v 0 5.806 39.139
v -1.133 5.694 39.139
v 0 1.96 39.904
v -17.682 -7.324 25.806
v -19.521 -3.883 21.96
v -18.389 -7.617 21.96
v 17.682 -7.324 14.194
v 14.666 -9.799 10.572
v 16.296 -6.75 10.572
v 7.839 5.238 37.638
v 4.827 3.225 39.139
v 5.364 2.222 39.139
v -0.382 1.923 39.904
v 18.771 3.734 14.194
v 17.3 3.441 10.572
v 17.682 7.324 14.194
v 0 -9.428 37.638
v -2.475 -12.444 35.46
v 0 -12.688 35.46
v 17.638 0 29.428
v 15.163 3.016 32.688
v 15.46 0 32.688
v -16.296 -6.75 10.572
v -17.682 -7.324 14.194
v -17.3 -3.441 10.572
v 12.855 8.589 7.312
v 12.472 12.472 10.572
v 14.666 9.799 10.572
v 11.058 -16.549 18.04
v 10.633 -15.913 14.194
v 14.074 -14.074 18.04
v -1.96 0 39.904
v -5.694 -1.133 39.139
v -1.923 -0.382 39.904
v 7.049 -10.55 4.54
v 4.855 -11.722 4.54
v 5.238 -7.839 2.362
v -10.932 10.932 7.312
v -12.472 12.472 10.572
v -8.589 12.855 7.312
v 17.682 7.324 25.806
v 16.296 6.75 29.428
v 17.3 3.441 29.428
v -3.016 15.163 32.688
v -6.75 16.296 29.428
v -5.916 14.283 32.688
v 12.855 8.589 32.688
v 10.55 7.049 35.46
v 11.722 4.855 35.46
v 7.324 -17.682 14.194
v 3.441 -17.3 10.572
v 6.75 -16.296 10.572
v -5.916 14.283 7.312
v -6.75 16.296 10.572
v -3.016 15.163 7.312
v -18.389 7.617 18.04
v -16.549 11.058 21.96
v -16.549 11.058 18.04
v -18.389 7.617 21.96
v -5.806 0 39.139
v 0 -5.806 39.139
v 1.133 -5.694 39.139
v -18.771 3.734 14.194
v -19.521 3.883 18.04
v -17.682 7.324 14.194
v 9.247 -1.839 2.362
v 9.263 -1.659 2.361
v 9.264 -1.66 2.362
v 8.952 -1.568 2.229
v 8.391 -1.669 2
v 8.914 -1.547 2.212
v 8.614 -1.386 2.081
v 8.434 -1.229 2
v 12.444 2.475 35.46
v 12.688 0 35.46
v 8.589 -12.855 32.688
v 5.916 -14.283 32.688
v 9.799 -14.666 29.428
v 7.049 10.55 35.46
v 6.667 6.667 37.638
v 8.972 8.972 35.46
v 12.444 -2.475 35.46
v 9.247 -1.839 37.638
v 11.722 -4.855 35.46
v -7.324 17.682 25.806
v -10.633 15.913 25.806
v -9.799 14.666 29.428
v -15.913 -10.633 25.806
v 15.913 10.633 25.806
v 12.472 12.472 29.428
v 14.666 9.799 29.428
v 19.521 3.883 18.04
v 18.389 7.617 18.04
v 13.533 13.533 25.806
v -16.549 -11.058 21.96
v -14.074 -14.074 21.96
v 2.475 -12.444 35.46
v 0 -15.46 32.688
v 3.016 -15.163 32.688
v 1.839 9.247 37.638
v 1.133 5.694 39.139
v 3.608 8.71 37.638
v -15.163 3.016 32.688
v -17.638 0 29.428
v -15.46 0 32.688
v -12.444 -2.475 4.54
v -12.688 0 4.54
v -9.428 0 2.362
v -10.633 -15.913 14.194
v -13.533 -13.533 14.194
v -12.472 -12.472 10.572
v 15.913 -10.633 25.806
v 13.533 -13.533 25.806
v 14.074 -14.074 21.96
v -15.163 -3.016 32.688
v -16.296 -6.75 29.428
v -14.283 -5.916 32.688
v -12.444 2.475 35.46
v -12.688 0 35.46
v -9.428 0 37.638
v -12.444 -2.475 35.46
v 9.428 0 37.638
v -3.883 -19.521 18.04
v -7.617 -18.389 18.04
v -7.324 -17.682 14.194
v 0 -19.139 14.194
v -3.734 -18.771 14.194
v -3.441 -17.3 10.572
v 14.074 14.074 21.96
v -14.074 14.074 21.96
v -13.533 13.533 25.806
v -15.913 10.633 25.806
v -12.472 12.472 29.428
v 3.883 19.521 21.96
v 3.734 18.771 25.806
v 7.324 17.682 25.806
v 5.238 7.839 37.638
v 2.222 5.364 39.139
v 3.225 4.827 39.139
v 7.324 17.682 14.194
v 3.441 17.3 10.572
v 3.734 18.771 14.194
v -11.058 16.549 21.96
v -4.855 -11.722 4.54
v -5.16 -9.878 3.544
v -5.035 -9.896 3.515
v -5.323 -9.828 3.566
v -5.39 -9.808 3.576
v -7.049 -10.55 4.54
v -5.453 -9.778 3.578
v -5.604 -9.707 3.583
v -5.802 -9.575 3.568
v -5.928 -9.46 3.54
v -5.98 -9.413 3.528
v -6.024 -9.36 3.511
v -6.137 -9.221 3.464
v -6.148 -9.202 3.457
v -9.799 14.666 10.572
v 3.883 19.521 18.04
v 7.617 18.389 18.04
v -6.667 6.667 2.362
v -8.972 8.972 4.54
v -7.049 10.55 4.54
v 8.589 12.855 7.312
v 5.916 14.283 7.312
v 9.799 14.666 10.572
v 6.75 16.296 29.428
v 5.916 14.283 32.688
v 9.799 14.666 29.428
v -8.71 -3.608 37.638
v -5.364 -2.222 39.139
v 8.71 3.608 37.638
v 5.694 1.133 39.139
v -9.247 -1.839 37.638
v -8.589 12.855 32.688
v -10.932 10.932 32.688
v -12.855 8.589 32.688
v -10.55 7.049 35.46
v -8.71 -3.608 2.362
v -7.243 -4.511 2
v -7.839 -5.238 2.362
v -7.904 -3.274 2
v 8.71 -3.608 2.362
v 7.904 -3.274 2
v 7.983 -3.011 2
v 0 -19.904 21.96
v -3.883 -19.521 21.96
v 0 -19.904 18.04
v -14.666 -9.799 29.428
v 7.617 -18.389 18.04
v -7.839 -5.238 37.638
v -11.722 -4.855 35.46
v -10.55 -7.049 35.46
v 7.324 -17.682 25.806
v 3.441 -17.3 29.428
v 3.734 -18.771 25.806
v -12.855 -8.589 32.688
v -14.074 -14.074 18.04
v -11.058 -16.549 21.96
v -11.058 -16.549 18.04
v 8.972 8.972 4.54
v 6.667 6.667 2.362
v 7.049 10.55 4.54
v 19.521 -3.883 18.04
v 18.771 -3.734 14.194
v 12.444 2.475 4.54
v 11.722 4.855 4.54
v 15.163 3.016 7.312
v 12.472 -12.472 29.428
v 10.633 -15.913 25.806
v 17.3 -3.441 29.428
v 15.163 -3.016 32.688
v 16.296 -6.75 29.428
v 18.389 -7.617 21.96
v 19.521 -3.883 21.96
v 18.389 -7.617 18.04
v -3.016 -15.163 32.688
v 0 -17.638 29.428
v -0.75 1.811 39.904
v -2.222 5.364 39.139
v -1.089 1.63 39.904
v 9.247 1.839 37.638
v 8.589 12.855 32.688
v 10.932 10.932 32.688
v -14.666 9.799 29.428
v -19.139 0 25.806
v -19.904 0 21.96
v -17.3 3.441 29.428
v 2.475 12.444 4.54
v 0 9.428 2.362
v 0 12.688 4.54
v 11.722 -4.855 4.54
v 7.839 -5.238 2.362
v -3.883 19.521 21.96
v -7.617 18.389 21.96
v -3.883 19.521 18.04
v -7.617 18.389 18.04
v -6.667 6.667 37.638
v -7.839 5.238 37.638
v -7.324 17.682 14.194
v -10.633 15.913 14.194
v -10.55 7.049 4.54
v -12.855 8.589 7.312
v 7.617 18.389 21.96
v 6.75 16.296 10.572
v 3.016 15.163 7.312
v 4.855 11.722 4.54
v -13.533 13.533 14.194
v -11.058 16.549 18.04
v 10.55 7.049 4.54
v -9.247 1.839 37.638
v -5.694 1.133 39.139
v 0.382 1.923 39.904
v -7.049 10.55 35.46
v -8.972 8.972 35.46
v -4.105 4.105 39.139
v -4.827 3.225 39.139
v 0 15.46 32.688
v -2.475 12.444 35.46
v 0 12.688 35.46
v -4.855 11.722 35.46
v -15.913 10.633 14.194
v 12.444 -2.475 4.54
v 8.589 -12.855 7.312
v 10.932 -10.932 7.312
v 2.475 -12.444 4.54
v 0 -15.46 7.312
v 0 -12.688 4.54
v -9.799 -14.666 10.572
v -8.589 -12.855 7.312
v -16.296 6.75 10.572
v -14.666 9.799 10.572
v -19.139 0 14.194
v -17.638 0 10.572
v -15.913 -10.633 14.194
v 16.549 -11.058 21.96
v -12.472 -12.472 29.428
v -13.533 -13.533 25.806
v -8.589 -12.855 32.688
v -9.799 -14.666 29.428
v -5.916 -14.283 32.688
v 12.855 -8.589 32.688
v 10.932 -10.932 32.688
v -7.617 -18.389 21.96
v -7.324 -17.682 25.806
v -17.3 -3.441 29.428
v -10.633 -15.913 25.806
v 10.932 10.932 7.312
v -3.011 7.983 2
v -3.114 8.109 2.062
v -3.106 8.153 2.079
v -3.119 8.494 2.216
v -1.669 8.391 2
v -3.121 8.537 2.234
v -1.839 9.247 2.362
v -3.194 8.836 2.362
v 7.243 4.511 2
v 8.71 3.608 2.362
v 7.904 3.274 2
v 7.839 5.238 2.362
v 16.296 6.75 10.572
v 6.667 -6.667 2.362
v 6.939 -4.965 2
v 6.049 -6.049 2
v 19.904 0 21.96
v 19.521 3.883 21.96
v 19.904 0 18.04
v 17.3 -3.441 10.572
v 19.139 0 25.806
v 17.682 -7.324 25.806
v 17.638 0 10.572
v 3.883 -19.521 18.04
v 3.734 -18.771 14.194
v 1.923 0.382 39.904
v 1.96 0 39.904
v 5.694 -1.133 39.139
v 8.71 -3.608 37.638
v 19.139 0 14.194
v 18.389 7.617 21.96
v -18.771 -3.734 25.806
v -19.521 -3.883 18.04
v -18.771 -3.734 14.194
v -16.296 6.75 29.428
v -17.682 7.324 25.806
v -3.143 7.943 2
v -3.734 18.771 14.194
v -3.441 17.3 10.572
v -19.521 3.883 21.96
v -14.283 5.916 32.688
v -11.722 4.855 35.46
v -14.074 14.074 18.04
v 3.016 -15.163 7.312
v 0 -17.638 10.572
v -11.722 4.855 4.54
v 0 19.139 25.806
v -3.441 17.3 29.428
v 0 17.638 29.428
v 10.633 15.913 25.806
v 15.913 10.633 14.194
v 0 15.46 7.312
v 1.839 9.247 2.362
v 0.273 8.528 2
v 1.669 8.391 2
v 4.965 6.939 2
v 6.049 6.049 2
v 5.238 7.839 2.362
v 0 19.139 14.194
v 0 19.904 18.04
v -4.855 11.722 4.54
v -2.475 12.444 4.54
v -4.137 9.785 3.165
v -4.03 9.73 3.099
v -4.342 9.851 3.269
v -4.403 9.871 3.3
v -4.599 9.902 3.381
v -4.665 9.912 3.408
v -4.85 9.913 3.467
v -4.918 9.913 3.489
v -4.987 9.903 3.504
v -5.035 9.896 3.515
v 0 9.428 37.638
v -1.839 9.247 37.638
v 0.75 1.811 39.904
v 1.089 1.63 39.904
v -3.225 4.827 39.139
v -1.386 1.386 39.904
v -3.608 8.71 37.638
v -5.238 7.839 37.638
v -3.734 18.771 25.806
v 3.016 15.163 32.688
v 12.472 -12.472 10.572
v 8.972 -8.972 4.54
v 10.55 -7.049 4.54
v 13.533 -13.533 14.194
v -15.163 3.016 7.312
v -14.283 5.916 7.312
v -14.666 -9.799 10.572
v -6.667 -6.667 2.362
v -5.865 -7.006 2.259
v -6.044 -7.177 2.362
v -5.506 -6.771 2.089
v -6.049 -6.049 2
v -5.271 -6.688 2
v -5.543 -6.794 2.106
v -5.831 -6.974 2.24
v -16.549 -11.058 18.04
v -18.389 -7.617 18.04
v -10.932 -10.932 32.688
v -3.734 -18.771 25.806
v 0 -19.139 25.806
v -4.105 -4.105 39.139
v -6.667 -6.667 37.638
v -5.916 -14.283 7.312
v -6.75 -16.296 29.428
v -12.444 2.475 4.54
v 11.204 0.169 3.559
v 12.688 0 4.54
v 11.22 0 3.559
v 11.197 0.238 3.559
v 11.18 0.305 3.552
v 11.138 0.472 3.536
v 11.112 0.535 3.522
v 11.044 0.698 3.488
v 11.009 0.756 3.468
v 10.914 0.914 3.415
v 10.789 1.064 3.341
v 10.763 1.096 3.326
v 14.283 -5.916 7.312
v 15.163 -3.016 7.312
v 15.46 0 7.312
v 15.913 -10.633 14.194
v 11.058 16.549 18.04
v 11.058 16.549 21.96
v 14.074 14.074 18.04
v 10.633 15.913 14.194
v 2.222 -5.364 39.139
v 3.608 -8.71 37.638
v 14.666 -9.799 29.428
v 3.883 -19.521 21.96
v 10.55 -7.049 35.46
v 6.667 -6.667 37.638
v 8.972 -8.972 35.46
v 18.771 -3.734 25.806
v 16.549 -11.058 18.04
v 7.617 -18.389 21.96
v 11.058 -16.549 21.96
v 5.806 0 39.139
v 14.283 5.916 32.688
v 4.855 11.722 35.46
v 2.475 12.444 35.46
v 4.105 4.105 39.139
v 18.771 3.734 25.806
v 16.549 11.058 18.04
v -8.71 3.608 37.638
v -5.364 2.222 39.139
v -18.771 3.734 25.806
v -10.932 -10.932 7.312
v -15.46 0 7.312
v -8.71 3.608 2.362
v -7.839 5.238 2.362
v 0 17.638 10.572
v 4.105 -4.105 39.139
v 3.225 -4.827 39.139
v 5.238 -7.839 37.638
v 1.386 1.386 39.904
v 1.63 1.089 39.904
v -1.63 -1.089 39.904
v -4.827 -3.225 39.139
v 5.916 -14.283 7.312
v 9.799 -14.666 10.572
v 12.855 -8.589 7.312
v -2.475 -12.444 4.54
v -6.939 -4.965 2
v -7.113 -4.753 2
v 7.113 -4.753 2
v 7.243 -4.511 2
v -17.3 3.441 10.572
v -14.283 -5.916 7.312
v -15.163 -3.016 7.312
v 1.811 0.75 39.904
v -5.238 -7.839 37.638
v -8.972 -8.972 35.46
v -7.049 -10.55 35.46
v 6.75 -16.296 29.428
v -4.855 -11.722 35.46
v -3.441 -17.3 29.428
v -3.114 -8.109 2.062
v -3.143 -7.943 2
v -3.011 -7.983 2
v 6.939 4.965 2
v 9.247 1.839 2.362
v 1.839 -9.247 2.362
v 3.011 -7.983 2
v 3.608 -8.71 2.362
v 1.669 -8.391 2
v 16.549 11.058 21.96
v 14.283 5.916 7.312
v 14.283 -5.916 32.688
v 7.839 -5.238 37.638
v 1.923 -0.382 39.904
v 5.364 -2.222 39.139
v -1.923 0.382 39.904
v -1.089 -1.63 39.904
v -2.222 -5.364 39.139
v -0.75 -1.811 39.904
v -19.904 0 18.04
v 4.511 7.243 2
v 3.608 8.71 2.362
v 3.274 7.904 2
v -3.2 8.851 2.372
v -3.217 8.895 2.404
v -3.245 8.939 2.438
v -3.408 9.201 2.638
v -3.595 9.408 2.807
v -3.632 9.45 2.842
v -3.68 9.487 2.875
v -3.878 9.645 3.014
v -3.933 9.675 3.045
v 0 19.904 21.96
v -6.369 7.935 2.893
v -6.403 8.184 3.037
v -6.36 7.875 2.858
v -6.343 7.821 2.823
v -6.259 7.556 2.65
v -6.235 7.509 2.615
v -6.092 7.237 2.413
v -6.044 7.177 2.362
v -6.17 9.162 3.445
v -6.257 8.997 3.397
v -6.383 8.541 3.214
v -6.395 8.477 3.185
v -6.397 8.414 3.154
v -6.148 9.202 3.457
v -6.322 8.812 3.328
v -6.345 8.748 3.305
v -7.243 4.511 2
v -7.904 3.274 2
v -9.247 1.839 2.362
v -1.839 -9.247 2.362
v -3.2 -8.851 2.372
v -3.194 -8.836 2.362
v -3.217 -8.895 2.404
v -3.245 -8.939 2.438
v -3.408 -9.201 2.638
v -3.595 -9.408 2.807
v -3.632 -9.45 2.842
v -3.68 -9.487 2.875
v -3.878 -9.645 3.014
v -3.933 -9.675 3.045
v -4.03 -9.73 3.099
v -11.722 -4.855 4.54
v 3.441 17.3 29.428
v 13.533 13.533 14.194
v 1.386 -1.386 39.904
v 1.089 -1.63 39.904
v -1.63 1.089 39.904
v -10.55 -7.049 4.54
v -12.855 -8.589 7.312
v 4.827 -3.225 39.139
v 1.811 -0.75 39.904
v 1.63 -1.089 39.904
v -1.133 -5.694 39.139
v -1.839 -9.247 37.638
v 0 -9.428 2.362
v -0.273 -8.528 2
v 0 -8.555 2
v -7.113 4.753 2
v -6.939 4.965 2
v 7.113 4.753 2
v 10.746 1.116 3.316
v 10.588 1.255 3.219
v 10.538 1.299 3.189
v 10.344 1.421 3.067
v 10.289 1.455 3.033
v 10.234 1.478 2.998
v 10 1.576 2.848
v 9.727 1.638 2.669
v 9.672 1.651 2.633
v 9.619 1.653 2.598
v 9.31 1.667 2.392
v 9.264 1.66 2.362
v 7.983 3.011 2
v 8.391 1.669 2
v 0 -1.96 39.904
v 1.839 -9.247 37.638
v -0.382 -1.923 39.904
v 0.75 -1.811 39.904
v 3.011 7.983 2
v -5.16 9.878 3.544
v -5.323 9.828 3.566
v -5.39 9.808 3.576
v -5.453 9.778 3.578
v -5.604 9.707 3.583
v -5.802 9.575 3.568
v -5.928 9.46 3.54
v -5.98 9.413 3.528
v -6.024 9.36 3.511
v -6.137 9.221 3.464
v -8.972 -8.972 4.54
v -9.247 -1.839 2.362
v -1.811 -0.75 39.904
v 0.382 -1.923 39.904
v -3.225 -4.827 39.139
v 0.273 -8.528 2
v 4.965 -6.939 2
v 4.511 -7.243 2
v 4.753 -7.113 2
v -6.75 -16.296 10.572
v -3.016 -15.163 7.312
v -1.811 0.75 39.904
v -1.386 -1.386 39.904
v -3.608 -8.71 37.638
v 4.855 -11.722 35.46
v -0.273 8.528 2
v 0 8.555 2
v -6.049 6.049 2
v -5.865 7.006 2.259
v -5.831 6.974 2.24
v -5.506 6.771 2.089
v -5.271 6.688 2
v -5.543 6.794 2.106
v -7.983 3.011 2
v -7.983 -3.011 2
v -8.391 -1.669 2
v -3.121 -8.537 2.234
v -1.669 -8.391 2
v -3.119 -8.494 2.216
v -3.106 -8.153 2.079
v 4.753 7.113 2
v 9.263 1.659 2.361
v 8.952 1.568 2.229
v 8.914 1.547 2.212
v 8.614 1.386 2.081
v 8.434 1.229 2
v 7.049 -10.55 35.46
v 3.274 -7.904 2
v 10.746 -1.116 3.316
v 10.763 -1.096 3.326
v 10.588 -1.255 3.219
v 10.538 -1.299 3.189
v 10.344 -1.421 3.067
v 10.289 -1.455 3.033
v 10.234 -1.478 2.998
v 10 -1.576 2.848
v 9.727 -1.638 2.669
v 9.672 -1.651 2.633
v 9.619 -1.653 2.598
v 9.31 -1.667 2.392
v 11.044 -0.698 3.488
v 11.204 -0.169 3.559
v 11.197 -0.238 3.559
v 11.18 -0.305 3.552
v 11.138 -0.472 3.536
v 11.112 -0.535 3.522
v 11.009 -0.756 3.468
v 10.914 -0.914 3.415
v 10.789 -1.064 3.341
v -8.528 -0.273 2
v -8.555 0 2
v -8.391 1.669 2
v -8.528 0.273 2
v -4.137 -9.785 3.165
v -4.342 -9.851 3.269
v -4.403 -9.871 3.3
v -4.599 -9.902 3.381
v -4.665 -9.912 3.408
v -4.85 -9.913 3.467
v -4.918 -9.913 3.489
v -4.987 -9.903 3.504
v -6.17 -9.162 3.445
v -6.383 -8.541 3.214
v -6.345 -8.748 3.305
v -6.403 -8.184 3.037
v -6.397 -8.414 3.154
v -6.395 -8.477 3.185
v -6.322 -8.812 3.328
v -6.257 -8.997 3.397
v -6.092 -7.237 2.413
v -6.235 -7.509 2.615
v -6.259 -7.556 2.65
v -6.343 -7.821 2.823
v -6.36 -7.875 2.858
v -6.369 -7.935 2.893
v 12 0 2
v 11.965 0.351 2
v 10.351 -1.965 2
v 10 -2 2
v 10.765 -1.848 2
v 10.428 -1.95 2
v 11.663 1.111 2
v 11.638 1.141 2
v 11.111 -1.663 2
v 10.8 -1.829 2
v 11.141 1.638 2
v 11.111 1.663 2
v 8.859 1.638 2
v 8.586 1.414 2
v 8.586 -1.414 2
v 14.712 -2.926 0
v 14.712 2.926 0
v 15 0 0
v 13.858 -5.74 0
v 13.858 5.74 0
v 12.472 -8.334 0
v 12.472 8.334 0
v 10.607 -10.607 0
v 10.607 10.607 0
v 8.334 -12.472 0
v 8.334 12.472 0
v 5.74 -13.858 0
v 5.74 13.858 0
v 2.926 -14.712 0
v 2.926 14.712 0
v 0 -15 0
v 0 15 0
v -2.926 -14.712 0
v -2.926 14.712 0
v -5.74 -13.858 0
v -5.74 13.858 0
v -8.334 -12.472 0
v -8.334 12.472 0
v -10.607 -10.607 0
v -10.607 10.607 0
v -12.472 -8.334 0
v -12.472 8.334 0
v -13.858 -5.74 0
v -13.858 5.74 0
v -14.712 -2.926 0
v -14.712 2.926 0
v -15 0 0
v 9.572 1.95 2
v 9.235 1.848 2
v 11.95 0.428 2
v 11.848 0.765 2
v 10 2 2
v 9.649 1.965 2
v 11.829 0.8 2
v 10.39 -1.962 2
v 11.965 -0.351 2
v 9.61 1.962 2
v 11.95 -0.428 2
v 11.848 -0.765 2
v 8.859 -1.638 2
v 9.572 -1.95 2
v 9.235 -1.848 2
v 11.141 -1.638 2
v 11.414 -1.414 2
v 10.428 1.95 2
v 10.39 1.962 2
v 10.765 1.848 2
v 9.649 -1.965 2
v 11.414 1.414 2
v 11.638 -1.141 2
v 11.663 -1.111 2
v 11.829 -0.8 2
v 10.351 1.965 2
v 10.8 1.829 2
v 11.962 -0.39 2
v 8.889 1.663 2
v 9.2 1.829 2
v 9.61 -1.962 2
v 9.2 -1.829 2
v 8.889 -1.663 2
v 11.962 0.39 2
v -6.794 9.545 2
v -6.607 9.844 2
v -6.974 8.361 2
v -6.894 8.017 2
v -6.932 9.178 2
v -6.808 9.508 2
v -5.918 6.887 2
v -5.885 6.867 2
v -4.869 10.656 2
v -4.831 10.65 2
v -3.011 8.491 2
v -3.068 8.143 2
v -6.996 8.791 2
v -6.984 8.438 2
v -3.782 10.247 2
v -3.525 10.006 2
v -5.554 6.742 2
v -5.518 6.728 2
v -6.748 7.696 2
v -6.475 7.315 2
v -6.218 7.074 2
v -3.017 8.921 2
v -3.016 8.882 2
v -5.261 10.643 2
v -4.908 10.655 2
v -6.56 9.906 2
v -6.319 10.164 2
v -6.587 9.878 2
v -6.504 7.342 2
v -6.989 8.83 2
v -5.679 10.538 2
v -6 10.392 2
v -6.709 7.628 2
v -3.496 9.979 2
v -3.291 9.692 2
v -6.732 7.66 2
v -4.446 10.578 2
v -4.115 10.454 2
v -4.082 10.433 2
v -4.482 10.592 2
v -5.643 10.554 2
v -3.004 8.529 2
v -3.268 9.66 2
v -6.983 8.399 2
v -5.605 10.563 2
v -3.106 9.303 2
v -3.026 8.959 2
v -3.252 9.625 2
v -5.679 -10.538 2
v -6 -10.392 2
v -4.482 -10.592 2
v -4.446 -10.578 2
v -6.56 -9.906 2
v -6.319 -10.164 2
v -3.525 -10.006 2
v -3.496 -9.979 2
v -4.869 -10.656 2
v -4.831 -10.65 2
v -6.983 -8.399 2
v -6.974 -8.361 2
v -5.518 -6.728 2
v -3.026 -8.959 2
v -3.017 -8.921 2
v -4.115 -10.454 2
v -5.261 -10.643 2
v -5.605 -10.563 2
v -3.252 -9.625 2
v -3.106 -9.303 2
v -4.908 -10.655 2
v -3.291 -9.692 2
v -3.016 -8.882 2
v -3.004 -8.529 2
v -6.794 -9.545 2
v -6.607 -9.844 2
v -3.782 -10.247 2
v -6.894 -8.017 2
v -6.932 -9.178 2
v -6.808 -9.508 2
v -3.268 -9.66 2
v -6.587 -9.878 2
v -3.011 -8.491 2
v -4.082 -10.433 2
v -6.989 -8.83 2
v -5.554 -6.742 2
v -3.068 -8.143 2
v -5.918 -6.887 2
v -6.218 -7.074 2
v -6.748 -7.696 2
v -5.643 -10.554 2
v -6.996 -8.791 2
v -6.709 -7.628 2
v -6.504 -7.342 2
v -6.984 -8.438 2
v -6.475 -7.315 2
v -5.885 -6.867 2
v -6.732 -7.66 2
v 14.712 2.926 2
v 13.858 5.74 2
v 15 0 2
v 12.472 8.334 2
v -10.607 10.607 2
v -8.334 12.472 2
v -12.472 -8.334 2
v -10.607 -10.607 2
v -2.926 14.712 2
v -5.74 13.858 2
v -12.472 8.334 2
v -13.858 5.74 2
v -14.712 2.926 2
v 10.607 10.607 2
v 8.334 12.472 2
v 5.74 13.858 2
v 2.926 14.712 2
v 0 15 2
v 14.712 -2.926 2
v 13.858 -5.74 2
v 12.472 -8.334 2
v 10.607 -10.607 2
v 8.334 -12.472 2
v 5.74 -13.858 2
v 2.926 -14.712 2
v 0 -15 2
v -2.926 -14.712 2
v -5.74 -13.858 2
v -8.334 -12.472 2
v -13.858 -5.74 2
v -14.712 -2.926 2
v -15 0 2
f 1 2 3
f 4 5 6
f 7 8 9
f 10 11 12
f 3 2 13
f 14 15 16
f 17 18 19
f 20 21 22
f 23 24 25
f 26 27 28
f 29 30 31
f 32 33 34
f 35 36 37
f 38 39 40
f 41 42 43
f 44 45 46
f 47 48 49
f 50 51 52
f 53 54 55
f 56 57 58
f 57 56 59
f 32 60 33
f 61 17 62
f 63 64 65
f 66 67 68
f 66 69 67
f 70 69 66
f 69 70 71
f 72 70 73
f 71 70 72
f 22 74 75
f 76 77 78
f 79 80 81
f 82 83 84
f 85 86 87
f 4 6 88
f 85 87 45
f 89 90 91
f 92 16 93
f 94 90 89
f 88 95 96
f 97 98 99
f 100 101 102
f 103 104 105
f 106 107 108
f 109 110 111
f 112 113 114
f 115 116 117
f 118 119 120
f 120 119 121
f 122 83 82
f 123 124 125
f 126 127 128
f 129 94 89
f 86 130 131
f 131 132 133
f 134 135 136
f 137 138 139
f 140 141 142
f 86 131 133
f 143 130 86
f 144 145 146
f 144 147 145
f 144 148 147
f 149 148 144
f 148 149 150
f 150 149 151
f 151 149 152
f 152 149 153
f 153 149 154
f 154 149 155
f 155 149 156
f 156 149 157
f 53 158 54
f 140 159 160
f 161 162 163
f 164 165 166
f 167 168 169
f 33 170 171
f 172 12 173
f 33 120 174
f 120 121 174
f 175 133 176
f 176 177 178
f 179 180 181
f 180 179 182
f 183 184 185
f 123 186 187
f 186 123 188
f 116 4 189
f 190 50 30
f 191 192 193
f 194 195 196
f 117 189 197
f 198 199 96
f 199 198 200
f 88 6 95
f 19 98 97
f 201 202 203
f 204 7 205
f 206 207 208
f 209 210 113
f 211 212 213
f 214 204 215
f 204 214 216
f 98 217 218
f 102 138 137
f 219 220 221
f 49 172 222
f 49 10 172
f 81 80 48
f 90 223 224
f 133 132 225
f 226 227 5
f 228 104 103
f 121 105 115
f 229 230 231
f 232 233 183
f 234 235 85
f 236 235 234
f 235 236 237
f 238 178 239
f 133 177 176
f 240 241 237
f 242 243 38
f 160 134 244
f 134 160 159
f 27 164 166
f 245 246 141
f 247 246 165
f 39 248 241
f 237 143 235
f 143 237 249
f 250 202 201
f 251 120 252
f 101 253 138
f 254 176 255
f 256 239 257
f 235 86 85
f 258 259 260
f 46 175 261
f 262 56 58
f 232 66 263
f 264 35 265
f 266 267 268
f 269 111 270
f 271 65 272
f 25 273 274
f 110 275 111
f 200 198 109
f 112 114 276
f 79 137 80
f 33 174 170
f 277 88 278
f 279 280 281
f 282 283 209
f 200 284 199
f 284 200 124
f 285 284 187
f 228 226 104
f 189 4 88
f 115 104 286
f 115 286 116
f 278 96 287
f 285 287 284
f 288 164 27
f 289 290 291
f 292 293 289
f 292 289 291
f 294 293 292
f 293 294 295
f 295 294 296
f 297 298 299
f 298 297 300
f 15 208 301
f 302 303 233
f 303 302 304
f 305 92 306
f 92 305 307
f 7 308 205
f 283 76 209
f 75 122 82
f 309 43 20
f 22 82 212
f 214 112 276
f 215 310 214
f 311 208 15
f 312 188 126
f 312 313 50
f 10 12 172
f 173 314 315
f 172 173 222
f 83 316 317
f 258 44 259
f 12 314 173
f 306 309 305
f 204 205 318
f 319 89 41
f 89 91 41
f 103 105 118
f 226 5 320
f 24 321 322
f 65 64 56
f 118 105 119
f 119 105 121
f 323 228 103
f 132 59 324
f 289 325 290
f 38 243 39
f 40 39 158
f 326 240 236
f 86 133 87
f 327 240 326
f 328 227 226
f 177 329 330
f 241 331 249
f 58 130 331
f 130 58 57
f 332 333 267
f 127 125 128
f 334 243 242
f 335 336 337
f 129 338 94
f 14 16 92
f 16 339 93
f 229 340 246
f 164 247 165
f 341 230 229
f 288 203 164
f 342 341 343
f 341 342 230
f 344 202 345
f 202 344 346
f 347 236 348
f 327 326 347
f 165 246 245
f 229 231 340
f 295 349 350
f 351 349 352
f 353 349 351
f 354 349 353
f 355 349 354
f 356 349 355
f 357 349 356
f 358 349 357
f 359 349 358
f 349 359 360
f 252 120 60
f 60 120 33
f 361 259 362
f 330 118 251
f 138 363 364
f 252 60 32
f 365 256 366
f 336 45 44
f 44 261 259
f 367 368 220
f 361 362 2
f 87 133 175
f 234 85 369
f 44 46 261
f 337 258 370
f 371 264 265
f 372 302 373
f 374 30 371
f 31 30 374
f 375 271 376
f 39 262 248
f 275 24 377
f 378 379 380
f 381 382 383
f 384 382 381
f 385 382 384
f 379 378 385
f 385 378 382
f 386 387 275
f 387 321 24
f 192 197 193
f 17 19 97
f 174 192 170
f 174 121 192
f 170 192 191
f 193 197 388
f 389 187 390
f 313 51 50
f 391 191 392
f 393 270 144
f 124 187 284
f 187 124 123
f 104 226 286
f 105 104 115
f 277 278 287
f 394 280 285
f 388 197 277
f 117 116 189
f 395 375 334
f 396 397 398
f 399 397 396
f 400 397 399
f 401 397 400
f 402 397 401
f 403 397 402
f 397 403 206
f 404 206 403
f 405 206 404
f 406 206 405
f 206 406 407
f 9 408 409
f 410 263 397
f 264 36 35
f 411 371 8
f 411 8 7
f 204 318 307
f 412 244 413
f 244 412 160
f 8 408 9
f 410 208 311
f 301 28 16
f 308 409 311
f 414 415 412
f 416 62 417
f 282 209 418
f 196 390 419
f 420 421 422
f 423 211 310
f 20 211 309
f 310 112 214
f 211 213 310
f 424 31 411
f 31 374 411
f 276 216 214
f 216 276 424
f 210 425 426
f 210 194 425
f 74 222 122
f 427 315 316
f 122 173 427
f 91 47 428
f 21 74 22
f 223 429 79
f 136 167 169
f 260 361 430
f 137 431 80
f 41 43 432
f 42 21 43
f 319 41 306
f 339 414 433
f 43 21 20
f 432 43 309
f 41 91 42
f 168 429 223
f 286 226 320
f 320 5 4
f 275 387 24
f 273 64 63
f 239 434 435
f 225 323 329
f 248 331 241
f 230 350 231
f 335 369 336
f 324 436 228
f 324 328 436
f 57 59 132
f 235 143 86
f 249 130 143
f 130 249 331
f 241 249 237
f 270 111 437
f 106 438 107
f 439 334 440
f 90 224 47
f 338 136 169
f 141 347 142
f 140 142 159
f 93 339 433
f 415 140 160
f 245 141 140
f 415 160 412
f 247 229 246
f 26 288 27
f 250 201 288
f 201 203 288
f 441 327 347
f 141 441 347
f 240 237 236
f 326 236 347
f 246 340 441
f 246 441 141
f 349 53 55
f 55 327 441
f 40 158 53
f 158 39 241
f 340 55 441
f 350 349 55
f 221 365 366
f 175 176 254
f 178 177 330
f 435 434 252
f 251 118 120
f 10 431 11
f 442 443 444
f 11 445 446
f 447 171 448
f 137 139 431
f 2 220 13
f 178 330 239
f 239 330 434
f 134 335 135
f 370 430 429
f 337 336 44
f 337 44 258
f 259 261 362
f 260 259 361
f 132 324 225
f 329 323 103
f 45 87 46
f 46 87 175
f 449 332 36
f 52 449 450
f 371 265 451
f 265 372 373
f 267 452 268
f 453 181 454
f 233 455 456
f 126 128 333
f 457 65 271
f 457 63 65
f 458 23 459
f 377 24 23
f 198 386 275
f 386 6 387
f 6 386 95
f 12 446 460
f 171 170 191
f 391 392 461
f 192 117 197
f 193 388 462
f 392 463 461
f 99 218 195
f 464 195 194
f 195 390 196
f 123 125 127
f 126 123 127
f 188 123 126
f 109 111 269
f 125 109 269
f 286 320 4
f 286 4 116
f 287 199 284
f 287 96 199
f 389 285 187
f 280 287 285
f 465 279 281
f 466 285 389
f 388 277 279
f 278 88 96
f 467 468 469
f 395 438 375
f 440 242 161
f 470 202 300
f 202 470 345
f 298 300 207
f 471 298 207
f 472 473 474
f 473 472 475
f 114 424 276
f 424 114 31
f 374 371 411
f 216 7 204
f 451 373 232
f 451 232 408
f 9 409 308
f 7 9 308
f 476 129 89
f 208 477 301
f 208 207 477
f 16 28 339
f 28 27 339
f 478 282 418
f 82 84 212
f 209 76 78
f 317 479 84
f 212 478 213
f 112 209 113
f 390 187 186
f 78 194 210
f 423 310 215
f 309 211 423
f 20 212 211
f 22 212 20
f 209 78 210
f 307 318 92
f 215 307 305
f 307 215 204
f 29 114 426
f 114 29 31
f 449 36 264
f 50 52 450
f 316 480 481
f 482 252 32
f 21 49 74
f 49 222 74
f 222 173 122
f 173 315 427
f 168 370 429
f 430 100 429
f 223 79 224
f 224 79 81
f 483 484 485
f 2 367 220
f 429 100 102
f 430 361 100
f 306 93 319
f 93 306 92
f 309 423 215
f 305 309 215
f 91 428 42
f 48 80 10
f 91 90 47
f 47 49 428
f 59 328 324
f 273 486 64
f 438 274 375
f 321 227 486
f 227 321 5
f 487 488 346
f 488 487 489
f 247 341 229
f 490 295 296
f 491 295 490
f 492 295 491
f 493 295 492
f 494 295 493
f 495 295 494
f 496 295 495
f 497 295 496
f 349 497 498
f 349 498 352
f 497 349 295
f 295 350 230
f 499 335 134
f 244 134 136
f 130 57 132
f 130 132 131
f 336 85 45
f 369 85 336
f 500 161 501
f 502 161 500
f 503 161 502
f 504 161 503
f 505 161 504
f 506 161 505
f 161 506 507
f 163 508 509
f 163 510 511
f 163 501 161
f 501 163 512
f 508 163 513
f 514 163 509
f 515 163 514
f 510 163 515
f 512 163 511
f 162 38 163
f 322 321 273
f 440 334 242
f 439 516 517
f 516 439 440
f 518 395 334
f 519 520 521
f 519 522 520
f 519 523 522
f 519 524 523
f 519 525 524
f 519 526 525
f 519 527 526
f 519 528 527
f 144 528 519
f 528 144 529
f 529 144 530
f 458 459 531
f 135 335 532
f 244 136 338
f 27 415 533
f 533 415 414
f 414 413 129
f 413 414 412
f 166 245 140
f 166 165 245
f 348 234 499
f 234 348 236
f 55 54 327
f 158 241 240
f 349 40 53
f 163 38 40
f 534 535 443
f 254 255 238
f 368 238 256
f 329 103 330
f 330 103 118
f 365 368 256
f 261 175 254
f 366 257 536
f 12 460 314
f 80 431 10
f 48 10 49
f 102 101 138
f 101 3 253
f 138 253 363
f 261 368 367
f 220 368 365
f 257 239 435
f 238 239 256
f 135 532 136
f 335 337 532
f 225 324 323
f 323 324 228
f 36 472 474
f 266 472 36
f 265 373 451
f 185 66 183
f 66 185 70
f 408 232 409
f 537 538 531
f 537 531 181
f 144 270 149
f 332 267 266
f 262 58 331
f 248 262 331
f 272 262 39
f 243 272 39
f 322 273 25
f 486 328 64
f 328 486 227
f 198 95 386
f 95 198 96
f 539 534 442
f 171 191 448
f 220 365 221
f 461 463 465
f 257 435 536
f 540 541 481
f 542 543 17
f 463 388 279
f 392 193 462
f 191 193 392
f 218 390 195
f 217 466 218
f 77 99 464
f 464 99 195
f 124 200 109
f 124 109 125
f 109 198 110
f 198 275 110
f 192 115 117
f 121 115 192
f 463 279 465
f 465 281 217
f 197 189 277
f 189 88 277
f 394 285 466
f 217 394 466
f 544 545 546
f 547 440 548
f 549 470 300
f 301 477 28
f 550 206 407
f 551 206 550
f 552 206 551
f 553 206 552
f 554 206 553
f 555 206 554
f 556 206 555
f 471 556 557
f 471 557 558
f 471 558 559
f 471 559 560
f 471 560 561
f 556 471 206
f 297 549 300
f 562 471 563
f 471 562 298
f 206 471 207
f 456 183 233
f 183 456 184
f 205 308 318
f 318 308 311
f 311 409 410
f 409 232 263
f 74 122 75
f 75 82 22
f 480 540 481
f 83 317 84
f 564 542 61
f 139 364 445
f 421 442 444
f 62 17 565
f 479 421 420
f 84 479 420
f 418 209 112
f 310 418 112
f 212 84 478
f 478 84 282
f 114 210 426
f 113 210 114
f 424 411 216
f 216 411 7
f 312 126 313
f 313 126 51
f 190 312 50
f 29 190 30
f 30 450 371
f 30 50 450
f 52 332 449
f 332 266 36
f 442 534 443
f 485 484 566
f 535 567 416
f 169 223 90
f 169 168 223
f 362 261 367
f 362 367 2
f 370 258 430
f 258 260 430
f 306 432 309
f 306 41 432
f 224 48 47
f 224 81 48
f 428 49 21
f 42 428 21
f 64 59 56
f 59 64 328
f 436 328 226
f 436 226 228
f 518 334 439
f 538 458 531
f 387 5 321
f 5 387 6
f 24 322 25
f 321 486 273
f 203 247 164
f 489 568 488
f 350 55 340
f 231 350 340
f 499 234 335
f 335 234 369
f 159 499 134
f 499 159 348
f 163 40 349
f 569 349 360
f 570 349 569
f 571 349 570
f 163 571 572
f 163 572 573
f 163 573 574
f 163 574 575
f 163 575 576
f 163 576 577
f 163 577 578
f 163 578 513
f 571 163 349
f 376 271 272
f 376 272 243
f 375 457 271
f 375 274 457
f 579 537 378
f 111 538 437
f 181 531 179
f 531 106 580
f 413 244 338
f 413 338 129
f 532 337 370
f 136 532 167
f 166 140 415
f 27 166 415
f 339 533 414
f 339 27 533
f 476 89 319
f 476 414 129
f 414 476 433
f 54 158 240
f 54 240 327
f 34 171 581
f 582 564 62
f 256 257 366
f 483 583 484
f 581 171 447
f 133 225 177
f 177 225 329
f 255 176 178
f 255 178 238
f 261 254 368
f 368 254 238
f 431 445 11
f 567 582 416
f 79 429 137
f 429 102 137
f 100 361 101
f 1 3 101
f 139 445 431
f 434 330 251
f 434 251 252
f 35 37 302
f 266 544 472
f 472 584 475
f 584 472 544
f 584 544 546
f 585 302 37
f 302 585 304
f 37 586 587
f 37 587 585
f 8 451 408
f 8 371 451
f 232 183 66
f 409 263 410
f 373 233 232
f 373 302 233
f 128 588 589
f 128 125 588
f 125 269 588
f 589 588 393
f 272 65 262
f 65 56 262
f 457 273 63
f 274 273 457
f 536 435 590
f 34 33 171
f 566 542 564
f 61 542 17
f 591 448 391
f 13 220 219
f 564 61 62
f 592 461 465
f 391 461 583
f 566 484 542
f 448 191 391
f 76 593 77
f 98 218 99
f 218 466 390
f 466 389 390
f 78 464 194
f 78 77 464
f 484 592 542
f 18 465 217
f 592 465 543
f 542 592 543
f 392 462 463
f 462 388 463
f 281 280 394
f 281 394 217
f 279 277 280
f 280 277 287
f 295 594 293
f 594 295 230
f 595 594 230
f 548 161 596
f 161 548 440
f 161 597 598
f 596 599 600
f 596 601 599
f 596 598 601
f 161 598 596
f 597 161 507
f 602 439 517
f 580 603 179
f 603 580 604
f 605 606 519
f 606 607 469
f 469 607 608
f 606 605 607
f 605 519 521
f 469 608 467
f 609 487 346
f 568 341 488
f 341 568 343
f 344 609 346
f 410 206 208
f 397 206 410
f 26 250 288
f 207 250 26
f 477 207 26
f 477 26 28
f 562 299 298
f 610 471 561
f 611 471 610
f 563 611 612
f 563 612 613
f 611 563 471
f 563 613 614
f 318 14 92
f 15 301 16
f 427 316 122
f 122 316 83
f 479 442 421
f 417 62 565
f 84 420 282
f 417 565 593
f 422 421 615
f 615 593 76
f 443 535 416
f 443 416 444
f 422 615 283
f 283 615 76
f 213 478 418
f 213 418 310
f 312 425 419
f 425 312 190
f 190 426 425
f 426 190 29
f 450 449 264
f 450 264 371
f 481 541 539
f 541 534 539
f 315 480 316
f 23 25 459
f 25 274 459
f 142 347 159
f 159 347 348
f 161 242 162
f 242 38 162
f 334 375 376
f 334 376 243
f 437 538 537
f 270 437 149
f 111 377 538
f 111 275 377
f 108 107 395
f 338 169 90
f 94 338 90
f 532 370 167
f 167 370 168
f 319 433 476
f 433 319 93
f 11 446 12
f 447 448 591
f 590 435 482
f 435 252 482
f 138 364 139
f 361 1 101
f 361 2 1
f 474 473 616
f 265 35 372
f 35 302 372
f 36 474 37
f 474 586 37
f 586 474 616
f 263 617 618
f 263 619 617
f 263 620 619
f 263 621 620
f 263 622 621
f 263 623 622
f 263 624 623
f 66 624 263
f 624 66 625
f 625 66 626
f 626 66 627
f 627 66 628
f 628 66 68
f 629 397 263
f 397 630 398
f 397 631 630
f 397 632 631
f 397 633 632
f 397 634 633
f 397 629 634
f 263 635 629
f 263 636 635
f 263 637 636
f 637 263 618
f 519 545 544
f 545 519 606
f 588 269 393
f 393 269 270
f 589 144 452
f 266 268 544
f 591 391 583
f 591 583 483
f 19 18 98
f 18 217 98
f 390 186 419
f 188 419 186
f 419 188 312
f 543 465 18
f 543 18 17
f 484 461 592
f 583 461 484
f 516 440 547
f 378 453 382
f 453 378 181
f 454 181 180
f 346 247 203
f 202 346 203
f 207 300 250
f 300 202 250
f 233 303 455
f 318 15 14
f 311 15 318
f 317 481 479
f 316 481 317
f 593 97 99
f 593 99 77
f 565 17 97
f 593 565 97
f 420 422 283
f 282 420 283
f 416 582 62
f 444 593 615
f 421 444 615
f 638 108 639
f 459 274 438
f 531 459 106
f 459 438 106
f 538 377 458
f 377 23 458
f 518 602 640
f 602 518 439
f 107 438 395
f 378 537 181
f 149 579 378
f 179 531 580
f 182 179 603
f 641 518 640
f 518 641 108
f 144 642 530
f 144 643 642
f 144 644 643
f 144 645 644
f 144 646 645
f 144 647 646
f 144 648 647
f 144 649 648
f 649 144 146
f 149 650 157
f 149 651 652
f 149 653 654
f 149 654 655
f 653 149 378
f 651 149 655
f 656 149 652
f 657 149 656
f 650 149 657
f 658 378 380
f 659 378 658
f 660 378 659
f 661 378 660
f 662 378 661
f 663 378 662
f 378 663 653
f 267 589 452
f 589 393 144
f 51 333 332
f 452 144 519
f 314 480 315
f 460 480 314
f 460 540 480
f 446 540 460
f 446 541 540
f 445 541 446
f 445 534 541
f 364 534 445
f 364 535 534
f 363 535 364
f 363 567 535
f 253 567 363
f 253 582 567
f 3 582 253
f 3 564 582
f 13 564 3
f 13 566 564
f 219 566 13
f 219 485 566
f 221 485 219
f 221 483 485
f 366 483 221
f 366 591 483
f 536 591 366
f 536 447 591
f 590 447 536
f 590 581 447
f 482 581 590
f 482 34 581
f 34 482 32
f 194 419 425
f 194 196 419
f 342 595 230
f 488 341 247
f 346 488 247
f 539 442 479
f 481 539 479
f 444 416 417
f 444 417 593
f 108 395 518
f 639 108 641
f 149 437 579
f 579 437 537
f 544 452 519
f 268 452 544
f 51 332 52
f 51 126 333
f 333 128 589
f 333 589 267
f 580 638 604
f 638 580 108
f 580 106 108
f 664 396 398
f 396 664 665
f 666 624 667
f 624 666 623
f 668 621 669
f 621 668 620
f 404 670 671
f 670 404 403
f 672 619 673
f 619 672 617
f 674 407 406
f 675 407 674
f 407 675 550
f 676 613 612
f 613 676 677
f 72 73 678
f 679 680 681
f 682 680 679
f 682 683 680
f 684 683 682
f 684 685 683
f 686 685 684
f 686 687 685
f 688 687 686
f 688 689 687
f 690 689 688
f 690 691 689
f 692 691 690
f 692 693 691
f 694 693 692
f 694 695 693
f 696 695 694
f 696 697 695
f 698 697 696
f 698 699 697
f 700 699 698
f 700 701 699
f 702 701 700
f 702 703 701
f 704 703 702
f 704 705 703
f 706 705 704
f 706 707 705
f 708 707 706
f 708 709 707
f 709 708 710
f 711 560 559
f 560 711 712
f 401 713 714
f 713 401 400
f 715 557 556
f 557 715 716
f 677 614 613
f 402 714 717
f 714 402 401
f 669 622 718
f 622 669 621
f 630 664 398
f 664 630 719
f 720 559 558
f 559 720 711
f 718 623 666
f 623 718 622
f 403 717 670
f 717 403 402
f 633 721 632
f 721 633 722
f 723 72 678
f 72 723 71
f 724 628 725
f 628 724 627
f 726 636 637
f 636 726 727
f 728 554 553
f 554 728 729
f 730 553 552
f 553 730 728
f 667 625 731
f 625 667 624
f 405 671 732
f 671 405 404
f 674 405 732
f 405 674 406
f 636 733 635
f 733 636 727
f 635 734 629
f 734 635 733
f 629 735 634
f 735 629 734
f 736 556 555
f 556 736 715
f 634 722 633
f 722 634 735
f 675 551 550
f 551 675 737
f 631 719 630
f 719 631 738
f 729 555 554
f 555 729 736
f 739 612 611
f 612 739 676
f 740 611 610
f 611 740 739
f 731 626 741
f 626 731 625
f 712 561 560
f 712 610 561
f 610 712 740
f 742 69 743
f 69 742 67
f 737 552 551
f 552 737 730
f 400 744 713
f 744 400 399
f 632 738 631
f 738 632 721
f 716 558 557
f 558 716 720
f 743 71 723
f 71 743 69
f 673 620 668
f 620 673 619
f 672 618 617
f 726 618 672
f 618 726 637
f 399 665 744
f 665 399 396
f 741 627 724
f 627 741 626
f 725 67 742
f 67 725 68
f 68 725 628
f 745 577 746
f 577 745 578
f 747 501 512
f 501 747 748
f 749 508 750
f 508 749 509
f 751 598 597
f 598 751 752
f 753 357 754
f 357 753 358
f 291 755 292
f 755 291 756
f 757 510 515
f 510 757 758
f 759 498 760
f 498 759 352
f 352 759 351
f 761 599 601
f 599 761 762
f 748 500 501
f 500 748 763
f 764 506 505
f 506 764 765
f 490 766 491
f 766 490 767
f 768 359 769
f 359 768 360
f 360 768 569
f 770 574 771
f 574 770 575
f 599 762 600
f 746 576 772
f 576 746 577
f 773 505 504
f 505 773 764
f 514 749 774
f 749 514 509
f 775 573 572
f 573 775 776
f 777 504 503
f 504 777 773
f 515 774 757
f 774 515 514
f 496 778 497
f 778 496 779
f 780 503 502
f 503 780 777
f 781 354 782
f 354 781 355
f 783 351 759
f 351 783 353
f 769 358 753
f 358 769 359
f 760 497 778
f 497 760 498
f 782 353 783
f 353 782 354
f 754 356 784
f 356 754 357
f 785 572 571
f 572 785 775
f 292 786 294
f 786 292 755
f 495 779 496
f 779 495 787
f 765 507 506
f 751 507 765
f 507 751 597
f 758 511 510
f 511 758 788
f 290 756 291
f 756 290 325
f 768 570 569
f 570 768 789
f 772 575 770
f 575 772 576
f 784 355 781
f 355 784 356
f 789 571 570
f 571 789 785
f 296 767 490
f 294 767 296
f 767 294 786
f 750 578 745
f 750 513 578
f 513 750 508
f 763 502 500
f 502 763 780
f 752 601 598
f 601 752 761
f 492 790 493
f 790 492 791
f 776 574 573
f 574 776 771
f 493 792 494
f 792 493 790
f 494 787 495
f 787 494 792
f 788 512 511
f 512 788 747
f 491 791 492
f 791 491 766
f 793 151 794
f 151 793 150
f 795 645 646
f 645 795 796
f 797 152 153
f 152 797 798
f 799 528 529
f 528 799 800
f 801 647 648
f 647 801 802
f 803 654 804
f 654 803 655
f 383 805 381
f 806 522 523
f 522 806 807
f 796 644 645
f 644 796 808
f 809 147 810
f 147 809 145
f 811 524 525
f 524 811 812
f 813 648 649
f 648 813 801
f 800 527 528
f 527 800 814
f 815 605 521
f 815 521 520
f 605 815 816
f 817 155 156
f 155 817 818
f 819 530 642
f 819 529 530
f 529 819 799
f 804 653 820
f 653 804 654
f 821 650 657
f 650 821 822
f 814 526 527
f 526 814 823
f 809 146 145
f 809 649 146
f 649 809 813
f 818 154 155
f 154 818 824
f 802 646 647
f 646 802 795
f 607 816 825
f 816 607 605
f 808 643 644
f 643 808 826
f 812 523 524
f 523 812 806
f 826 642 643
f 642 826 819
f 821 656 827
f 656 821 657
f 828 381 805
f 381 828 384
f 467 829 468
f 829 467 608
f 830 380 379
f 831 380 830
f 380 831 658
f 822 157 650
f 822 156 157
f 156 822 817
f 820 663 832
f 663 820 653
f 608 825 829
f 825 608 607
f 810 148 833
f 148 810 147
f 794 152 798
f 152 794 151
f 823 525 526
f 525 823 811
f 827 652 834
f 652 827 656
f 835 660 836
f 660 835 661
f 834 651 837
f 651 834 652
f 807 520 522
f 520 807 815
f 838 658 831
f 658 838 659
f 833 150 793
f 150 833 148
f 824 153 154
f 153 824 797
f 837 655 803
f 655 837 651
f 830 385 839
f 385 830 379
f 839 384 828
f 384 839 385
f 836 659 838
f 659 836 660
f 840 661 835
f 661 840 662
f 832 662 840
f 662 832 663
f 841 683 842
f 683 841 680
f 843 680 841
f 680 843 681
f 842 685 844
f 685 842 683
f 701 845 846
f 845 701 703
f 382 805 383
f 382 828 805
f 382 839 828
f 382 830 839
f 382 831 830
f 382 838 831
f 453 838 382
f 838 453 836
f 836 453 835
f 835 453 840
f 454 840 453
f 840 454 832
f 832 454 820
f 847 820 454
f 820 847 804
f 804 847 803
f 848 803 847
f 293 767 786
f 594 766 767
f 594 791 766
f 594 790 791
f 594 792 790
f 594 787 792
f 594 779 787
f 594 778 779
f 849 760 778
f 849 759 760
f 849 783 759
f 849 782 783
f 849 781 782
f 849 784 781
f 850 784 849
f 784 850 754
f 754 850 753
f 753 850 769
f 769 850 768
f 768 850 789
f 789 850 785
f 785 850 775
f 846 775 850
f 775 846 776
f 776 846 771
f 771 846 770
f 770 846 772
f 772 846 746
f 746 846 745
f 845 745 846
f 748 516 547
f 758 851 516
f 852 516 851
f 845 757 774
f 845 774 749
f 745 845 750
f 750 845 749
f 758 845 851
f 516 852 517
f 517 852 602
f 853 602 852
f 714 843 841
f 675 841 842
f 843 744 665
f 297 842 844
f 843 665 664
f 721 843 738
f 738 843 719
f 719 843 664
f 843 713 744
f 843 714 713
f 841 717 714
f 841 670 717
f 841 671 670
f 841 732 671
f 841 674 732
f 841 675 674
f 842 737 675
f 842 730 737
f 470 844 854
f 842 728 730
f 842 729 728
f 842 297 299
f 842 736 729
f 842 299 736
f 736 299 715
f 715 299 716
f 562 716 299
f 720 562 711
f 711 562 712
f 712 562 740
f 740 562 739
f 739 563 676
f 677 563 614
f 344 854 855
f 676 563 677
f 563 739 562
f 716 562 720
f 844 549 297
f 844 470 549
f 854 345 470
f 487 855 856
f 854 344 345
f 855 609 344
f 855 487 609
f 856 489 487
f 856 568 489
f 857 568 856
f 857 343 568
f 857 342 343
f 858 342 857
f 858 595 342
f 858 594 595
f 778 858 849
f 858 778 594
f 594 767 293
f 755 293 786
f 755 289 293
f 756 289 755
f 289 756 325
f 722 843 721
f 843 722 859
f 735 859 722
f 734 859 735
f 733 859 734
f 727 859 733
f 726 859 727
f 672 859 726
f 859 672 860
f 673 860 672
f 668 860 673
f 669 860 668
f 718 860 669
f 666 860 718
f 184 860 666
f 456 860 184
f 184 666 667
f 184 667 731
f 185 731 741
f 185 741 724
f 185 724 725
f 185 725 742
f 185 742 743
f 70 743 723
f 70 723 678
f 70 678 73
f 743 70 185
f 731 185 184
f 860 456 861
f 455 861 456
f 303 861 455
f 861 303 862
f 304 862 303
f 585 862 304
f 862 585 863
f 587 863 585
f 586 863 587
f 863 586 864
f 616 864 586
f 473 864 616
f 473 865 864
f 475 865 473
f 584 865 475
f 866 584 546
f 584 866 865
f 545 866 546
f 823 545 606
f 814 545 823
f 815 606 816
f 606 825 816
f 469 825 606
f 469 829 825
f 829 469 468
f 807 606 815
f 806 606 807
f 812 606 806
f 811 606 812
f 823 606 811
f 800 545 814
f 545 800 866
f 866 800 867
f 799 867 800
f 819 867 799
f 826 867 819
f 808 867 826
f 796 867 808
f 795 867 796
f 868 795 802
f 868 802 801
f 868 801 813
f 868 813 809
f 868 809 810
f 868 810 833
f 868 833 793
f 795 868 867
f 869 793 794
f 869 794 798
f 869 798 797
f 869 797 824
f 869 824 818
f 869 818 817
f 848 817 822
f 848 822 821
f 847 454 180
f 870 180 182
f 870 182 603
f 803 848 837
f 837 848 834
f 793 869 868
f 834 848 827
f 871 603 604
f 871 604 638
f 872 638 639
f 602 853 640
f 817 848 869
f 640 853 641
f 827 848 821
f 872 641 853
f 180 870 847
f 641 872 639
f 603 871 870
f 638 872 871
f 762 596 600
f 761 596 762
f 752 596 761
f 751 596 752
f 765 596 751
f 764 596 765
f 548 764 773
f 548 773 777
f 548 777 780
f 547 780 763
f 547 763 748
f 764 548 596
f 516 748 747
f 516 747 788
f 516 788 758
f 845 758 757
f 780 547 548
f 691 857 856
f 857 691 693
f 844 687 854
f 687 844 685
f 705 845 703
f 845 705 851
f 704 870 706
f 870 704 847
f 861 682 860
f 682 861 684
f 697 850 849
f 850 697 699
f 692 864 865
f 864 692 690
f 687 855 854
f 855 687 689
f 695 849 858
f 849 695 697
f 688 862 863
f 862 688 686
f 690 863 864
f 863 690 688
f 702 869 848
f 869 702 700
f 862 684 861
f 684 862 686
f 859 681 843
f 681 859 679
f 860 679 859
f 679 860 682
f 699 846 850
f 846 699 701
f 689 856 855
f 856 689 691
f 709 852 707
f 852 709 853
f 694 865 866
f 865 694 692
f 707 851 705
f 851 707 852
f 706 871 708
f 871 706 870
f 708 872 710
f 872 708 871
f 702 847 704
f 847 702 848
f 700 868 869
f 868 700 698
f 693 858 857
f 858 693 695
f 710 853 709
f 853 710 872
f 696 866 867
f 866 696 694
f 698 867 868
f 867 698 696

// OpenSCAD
$fn = 32;

// Crystal Ball
// A mystical scrying orb mounted on an ornate three-legged stand.

module crystal_ball() {
    // The orb itself
    color("lightblue", 0.5)
    sphere(r=20);
    
    // Inner glowing core
    color("white")
    sphere(r=5);
}

module stand() {
    // Central pillar
    cylinder(h=10, r=3);
    
    // Ornate legs
    for (i = [0 : 120 : 360]) {
        rotate([0, 0, i])
        translate([10, 0, 0])
        cylinder(h=5, r1=3, r2=0.5);
        
        rotate([0, 0, i])
        translate([10, 0, 5])
        cylinder(h=5, r1=2, r2=0.5);
    }
    
    // Base plate
    cylinder(h=2, r=15);
}

// Assembly
translate([0, 0, 20])
crystal_ball();

translate([0, 0, 0])
stand();
